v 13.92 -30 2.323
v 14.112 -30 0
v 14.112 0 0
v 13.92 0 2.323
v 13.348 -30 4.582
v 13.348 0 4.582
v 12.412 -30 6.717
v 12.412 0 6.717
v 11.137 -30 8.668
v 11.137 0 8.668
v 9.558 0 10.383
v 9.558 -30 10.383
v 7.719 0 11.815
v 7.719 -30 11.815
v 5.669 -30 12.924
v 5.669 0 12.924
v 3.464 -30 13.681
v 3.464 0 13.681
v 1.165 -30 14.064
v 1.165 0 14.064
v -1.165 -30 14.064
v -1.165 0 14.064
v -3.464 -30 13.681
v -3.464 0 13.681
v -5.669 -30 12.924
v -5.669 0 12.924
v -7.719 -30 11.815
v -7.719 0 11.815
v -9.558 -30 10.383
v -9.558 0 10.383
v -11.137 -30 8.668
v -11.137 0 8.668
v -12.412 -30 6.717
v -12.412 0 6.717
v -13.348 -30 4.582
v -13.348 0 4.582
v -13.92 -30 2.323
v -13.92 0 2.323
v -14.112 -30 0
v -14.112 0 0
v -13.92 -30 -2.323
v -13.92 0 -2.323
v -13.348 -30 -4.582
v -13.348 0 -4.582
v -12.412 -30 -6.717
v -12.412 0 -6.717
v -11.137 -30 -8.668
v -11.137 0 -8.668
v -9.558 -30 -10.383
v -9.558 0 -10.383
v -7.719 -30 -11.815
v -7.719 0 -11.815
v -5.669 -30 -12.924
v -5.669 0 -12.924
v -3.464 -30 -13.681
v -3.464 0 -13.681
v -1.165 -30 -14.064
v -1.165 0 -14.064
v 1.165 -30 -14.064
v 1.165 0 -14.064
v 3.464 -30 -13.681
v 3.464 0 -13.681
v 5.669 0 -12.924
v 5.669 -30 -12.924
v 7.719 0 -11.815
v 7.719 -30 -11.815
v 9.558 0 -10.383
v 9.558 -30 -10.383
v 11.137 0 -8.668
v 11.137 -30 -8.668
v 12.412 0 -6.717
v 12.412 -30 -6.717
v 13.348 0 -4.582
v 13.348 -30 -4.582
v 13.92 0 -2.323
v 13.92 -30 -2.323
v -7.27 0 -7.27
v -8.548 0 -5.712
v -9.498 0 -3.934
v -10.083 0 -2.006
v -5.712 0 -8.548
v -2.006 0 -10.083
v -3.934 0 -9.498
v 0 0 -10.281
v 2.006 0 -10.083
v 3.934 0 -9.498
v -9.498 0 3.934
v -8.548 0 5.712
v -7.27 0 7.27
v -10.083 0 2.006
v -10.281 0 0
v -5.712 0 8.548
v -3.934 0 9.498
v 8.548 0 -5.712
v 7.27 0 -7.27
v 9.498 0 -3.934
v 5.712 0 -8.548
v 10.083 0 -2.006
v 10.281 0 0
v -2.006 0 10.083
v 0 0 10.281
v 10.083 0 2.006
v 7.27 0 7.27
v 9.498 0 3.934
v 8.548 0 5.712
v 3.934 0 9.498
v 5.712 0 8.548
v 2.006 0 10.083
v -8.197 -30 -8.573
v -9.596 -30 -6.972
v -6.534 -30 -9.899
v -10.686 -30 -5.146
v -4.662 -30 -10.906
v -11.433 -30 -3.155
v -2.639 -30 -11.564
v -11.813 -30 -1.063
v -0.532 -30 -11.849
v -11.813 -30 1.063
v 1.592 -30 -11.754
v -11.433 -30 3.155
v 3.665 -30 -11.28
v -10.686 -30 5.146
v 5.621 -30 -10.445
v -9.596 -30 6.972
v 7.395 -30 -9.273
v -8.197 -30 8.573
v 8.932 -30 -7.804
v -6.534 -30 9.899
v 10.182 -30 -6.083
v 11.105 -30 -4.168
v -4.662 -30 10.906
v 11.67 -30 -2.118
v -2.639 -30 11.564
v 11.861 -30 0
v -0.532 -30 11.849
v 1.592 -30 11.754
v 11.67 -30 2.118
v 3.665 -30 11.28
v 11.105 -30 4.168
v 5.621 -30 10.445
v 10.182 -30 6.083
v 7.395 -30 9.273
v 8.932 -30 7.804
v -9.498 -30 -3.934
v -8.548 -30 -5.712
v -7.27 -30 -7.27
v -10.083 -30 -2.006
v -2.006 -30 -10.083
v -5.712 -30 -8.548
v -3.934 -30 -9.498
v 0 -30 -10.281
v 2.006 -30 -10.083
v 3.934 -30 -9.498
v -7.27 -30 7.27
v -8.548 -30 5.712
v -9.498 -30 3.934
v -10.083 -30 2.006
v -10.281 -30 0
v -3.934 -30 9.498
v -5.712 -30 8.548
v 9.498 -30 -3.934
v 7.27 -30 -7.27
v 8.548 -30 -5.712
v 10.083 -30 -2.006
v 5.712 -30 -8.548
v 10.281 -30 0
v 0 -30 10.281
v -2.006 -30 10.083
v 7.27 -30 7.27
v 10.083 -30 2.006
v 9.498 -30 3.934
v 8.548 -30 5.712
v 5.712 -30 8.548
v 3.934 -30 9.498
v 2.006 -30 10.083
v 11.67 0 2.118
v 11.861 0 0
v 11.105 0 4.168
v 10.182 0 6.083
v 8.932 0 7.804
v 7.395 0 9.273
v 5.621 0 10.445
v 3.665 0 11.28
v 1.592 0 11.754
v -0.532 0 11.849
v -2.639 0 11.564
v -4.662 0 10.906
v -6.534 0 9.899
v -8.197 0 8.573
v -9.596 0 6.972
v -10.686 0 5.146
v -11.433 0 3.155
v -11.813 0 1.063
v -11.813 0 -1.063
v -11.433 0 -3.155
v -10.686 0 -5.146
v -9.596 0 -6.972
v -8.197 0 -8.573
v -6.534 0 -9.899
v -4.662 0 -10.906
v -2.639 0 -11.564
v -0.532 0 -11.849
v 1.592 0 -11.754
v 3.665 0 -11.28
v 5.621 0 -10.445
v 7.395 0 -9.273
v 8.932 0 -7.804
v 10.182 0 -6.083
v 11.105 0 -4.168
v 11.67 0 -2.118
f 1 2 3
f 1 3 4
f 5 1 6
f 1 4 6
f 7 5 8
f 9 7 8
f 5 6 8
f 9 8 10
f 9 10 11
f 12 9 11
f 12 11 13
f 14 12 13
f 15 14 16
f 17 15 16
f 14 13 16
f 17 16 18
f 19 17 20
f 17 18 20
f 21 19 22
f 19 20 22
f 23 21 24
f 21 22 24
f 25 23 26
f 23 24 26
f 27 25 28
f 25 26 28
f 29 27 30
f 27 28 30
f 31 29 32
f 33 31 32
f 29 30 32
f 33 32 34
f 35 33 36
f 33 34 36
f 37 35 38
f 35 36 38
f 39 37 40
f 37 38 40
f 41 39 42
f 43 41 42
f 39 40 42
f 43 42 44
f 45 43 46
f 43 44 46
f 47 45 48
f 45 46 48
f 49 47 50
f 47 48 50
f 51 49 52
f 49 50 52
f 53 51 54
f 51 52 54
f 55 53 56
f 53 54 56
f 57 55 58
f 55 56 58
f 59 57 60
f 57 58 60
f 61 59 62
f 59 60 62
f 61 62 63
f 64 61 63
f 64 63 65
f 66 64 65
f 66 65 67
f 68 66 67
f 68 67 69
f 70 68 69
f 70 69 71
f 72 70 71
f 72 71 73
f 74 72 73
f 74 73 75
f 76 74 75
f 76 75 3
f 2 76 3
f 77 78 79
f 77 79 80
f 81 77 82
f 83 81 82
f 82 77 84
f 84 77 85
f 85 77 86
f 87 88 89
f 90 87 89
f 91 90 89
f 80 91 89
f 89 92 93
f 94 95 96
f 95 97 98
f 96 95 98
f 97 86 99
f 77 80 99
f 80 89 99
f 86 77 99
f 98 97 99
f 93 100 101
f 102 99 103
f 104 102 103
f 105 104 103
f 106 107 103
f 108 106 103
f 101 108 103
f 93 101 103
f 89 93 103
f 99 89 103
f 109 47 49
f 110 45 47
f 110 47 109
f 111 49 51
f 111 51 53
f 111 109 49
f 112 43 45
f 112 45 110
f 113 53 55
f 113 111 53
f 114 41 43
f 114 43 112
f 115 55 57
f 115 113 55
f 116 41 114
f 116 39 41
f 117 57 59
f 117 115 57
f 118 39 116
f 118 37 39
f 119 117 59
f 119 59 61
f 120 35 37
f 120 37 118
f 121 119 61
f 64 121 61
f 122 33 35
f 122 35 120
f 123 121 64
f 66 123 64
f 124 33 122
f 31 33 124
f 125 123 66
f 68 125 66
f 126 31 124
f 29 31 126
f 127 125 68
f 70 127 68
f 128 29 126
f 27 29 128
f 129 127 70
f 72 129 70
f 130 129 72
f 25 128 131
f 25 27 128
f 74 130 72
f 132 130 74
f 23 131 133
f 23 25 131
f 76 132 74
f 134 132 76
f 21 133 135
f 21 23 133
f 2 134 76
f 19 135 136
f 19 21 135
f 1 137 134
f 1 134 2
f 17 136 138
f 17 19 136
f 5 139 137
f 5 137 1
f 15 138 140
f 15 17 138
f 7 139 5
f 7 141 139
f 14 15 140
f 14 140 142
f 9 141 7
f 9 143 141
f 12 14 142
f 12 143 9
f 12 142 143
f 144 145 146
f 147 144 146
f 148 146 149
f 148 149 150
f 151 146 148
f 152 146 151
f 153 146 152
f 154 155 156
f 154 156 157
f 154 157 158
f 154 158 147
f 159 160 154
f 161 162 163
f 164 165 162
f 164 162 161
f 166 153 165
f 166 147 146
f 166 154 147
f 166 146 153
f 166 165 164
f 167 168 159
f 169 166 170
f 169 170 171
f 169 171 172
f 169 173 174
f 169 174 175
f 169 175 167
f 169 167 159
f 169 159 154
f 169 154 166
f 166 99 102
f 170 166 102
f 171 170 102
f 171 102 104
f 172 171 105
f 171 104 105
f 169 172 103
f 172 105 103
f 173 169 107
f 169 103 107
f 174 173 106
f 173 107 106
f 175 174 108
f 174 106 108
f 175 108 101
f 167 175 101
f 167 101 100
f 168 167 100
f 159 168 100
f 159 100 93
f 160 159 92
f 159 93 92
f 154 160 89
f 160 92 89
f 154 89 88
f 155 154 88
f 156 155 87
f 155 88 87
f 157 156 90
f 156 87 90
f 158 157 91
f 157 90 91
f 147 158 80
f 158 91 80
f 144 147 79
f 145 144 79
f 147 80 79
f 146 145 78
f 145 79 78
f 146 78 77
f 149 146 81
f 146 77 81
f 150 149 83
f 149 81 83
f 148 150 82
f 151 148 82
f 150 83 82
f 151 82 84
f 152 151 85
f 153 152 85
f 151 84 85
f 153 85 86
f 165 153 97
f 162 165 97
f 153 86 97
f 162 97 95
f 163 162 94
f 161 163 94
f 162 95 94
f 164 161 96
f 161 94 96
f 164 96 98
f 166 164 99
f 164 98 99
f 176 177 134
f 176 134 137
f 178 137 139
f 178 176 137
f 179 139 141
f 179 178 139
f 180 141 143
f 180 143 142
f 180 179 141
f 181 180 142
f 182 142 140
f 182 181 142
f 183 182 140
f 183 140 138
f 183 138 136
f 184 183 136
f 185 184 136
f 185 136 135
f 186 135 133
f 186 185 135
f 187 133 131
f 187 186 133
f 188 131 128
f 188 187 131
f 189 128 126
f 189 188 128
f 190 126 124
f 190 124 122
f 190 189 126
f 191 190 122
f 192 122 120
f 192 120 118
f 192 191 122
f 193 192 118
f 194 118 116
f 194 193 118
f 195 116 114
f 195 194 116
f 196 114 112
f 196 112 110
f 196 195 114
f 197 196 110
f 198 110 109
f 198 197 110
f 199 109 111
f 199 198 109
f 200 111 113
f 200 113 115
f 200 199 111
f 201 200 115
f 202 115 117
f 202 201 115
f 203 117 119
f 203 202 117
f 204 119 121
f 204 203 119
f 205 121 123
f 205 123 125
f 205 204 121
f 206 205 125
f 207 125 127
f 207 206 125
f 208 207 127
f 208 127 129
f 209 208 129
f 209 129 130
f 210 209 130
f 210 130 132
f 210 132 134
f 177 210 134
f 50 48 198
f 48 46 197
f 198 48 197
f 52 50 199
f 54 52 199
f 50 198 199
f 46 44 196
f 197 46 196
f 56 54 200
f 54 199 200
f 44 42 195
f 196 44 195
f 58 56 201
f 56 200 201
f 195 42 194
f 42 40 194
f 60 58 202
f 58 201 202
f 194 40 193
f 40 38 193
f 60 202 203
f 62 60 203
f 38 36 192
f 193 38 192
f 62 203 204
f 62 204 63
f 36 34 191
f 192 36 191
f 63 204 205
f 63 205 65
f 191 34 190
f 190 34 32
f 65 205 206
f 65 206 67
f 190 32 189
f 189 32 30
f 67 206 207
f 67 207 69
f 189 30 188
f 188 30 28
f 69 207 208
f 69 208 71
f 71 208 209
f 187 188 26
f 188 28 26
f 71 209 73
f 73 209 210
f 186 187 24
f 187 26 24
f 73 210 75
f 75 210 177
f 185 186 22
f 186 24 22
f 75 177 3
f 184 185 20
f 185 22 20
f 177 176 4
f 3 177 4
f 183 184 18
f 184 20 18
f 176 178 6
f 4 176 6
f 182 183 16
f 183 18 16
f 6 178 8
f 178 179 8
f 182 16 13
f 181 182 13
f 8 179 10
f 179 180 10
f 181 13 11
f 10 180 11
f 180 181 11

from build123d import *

# Parameters (mm, degrees)
F0_R     = 10.280997
F1_DEPTH = 30
F2_R     = 14.112493
F2_R_2   = 11.860886
F3_DEPTH = 30


with BuildPart() as f1:
    # F0 (on Front) → F1 (new body)
    with BuildSketch(Plane.XZ):
        Circle(F0_R)
    extrude(amount=F1_DEPTH)


with BuildPart() as f3:
    # F2 (on Front) → F3 (new body)
    with BuildSketch(Plane.XZ):
        Circle(F2_R)
        Circle(F2_R_2, mode=Mode.SUBTRACT)
    extrude(amount=F3_DEPTH)


solid = Compound([f1.part, f3.part])
